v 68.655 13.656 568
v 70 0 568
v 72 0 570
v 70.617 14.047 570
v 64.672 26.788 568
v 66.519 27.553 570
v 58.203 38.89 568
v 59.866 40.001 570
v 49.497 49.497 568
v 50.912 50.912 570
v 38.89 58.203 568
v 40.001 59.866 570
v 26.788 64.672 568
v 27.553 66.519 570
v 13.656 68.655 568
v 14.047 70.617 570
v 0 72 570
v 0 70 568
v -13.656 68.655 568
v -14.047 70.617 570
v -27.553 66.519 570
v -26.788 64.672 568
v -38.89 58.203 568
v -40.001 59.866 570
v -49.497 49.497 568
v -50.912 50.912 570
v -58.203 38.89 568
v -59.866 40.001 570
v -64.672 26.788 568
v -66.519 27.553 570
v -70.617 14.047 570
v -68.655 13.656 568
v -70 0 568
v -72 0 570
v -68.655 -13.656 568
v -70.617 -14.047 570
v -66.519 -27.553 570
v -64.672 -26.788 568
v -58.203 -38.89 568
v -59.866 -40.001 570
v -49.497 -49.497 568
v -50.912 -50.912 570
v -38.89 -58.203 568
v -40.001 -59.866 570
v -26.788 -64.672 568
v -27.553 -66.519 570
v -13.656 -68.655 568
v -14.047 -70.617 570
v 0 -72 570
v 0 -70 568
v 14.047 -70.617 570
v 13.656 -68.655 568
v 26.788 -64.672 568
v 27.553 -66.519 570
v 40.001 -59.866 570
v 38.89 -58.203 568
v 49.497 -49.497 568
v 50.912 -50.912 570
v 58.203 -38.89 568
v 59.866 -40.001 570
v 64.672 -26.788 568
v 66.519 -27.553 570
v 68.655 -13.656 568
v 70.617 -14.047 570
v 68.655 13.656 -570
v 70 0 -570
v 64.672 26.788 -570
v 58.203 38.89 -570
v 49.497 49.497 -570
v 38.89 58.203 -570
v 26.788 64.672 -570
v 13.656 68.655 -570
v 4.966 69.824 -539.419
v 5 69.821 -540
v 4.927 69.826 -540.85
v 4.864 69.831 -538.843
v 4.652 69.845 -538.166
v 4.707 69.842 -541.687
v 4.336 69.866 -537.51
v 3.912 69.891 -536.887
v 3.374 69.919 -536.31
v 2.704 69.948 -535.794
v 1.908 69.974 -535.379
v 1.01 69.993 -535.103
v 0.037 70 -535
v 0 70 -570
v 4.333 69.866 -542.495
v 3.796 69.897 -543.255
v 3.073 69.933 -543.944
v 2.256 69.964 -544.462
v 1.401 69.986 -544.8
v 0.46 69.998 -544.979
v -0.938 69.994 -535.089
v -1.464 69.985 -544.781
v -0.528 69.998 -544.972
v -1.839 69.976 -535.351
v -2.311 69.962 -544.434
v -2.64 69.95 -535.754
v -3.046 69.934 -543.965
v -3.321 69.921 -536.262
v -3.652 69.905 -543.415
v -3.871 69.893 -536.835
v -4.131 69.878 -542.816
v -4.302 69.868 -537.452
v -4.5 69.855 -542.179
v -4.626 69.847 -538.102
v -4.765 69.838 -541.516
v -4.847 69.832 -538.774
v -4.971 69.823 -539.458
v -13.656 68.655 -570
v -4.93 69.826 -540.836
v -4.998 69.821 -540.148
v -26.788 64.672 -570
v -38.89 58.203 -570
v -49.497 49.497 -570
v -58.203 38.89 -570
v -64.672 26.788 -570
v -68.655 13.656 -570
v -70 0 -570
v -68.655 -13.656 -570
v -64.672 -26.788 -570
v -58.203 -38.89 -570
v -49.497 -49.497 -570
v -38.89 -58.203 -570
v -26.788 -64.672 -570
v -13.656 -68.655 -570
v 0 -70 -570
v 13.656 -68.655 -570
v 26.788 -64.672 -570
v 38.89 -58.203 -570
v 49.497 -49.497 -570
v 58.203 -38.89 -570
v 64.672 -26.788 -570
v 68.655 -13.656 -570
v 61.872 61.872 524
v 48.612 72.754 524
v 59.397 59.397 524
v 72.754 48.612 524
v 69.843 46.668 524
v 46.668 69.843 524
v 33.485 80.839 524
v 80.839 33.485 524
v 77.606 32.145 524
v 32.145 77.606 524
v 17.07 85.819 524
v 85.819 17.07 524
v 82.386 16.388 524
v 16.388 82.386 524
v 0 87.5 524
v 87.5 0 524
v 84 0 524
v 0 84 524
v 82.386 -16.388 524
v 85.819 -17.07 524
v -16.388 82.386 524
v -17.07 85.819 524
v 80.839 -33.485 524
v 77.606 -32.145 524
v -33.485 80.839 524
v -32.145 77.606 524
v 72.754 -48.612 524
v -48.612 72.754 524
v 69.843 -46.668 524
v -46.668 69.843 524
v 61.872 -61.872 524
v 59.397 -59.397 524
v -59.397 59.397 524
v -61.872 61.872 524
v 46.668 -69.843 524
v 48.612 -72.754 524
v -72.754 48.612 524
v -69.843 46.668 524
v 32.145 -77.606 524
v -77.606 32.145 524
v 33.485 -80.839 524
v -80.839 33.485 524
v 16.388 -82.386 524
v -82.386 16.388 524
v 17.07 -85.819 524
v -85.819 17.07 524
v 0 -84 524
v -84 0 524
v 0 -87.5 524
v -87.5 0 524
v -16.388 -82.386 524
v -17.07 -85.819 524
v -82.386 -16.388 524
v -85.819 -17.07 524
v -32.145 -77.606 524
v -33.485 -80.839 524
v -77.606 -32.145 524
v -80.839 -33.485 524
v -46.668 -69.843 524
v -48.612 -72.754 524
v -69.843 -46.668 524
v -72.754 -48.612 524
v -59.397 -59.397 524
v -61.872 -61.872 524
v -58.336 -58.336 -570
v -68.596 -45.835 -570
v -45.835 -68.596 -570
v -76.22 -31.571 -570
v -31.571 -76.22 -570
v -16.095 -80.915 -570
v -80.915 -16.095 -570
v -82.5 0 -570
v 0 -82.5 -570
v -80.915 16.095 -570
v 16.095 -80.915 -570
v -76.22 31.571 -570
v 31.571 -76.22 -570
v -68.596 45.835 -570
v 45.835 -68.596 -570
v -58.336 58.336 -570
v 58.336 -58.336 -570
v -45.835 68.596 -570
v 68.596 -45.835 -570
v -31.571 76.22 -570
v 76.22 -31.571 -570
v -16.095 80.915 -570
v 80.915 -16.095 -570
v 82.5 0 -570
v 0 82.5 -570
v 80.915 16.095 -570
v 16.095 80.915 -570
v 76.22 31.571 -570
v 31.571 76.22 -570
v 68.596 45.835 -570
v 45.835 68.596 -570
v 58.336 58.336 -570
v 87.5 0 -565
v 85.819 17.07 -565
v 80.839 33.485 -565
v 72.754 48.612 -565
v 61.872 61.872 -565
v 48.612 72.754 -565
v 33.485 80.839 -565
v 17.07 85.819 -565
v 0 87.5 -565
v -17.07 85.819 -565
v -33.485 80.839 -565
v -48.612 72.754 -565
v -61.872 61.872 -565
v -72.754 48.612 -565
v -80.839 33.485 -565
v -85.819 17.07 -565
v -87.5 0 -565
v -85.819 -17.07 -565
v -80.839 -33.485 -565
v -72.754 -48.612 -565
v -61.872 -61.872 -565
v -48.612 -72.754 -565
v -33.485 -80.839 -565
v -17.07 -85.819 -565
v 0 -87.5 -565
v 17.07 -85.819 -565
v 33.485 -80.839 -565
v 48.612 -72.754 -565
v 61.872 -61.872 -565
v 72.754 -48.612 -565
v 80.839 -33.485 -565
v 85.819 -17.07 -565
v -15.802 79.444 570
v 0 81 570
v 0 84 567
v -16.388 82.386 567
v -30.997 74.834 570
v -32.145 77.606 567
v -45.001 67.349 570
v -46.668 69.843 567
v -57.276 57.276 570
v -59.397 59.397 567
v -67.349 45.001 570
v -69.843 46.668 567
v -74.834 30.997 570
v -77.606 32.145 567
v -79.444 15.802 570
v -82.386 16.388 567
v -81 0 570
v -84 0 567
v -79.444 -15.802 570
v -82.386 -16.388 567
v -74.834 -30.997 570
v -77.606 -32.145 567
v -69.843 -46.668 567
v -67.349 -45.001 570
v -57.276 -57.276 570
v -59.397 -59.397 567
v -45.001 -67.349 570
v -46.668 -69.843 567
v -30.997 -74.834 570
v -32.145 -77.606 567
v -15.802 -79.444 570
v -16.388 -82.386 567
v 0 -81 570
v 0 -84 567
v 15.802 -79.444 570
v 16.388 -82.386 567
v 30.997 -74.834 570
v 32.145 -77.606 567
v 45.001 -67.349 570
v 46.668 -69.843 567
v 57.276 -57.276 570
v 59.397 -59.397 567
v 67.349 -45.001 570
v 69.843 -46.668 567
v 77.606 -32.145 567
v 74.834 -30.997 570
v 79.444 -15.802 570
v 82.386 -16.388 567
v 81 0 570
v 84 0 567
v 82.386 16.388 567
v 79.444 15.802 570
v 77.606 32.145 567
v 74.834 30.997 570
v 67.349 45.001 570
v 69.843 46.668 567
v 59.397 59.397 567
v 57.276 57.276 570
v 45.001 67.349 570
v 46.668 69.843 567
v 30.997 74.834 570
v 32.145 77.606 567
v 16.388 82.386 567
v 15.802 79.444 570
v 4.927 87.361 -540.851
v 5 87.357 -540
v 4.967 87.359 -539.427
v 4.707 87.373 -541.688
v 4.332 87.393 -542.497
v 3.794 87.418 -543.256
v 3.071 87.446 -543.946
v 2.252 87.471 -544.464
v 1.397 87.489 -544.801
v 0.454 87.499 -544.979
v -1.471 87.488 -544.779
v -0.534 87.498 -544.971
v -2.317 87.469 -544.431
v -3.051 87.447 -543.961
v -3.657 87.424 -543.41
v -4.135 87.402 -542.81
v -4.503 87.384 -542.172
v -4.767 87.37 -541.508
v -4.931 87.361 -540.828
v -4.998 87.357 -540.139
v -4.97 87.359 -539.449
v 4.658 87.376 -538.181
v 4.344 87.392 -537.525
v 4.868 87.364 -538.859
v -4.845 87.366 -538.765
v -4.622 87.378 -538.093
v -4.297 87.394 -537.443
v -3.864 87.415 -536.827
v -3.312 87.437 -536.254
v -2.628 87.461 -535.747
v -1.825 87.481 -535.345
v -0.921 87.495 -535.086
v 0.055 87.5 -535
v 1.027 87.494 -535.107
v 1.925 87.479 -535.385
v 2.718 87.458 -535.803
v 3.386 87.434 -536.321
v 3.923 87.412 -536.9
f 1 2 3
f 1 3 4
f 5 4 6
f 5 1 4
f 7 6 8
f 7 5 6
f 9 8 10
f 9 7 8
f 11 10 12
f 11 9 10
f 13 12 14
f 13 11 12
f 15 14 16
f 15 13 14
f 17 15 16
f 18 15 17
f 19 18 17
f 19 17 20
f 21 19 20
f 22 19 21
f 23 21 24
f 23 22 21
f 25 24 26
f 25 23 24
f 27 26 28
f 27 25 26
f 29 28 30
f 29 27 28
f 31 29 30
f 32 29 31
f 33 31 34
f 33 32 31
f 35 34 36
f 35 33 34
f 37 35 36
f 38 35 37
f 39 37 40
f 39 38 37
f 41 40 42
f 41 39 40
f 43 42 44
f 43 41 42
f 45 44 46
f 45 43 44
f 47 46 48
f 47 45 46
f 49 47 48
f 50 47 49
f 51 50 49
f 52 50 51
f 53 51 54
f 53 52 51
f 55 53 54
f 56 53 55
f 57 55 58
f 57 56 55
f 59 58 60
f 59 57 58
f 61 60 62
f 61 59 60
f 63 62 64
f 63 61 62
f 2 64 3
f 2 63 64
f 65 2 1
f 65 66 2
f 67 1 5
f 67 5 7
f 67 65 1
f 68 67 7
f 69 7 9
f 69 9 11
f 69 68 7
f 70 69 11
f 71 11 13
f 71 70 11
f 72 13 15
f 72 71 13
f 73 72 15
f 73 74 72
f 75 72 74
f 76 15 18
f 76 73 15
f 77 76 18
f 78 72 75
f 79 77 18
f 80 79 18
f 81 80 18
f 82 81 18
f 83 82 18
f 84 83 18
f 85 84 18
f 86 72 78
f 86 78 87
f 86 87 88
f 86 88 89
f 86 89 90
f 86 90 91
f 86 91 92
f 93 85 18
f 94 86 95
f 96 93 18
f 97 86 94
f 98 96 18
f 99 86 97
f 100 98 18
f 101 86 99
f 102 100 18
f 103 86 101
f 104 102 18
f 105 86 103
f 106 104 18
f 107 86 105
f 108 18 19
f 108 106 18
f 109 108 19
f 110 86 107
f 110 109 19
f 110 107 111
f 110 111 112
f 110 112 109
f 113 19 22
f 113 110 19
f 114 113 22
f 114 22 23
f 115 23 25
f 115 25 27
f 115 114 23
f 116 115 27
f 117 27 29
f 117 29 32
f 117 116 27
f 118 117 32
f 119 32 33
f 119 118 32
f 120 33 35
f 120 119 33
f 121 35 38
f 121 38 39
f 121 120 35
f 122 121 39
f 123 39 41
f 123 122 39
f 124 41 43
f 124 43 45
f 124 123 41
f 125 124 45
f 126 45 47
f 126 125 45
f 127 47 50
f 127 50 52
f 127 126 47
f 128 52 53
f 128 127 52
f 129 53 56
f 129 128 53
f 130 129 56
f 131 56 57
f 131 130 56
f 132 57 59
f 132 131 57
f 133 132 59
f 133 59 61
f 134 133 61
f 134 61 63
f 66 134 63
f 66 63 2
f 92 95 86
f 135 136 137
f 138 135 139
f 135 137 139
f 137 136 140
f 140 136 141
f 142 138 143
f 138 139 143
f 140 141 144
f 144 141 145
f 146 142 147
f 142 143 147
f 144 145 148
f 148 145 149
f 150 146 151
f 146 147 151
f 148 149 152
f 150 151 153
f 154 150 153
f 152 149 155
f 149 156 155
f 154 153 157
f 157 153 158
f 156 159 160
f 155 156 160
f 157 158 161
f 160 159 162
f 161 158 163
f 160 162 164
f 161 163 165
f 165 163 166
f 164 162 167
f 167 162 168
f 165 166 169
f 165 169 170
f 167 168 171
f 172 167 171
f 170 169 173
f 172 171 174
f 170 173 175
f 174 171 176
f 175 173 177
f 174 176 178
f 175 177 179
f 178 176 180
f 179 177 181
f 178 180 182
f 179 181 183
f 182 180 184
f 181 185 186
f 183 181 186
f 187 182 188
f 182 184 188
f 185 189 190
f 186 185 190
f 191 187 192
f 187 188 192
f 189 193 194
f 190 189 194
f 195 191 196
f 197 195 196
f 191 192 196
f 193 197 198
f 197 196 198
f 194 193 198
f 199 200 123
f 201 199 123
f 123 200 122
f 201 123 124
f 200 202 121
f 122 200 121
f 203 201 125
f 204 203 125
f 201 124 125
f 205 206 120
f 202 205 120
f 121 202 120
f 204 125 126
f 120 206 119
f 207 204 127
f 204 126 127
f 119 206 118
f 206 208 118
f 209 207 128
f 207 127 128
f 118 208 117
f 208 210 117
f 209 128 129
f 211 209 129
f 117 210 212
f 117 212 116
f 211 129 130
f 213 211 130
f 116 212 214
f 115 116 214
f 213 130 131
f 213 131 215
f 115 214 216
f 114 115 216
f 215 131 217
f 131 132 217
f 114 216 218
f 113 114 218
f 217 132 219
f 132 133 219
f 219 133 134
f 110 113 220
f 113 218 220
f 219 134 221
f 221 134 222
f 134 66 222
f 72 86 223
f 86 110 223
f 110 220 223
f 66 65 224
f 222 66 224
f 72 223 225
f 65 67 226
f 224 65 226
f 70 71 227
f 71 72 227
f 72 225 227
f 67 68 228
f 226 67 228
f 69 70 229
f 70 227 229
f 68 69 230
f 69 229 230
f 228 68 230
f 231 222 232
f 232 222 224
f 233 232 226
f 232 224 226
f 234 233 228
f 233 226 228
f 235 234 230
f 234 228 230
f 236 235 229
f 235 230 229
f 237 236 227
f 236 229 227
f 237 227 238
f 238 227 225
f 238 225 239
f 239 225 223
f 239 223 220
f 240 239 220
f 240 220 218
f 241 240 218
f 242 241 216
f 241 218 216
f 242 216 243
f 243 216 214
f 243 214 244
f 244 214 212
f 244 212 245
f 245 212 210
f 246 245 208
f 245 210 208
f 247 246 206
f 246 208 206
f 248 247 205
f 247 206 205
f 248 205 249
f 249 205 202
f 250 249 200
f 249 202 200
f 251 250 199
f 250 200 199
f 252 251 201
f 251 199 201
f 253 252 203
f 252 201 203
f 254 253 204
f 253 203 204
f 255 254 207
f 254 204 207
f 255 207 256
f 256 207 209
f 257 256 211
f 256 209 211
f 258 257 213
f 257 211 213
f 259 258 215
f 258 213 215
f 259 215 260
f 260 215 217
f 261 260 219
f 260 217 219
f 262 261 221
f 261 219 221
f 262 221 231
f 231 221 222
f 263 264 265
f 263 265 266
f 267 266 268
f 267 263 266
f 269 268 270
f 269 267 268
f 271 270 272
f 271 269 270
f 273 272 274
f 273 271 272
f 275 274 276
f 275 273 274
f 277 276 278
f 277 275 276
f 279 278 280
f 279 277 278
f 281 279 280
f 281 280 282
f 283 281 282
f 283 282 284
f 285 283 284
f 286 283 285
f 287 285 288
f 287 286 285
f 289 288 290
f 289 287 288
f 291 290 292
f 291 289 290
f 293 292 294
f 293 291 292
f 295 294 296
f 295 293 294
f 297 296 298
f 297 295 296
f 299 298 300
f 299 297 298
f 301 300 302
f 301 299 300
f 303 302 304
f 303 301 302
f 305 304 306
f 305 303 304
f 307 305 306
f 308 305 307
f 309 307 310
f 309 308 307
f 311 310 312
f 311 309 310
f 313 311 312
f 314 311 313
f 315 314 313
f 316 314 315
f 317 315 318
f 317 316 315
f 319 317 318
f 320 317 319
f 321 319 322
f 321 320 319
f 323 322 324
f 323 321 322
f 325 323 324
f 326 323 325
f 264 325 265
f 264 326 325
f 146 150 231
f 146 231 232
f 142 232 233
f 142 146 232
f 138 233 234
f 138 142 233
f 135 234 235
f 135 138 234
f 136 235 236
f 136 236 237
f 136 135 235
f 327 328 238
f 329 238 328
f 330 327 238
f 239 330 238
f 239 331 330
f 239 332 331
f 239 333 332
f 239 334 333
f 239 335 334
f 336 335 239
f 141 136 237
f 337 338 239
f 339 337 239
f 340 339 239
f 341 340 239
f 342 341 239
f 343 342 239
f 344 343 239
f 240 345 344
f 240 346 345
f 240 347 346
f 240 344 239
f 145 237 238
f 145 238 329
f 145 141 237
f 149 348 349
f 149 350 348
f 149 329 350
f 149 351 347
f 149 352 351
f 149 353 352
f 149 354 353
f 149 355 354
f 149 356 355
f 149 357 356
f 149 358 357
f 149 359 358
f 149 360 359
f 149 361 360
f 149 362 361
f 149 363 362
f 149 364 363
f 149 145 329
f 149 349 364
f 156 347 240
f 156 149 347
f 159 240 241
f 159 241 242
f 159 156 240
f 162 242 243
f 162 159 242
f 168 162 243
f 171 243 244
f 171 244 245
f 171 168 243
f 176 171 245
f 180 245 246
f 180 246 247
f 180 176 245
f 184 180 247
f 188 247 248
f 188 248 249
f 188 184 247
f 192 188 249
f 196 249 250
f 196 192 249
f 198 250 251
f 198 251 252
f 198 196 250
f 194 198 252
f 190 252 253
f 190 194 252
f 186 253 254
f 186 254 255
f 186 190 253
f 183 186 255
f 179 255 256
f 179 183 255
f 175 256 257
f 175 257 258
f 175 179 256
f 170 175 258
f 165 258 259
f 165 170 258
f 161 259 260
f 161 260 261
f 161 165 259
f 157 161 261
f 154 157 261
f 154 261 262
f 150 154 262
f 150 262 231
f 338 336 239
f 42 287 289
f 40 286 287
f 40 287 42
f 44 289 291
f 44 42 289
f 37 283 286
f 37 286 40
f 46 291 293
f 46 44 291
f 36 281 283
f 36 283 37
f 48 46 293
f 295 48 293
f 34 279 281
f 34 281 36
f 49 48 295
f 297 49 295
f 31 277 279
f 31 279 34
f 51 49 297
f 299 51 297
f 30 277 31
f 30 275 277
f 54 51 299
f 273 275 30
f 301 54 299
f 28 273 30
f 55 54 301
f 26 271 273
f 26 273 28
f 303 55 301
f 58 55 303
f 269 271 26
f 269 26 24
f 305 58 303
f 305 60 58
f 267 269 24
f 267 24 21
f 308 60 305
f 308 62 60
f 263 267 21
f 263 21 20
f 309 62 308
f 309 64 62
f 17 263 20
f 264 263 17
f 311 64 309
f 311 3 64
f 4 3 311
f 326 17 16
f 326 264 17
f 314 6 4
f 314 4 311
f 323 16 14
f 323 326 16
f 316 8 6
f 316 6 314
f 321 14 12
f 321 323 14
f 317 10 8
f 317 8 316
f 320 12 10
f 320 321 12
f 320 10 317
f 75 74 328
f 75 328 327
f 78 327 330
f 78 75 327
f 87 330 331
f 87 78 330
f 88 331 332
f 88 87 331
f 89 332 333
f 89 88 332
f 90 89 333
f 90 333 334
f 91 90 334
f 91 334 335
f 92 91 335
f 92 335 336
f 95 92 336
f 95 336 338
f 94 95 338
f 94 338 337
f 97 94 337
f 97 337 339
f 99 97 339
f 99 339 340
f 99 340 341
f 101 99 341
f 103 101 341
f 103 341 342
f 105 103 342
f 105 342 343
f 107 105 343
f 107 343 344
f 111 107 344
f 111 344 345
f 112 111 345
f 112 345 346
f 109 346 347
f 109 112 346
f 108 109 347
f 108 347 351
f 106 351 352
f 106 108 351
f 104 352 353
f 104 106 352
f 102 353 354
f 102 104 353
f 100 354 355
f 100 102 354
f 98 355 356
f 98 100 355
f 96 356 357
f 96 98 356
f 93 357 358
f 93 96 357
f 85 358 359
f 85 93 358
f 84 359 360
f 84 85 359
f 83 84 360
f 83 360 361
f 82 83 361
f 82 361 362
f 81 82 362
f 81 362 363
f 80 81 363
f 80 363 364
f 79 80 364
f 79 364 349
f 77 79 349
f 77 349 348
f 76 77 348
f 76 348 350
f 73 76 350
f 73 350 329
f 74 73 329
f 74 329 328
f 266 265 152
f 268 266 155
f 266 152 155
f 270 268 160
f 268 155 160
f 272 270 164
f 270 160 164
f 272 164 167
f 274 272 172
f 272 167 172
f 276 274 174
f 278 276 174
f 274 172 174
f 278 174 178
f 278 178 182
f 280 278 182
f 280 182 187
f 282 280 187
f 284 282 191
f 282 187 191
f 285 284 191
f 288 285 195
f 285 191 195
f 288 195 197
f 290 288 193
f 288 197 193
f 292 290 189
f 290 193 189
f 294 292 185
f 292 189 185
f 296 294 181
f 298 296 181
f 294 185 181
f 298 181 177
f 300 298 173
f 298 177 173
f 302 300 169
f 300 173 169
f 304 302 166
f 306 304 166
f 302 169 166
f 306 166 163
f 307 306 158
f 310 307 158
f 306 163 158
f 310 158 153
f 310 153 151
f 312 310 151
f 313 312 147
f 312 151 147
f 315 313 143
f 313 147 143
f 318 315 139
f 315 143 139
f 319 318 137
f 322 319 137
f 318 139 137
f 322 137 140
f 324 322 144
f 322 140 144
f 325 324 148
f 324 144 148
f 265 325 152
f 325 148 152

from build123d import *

# Parameters (mm, degrees)
SKETCH1_R           = 87.5
SKETCH1_R_2         = 70
BOSS_EXTRUDE1_DEPTH = 570
CHAMFER1_SIZE       = 5
SKETCH3_W           = 46
SKETCH3_H           = 23.271648671
CHAMFER2_SIZE       = 3
CHAMFER3_SIZE       = 2
SKETCH4_R           = 5
CUT_EXTRUDE1_DEPTH  = 102


with BuildPart() as part:
    # Sketch1 → Boss-Extrude1 (new body, symmetric)
    with BuildSketch(Plane.XY):
        Circle(SKETCH1_R)
        Circle(SKETCH1_R_2, mode=Mode.SUBTRACT)
    extrude(amount=BOSS_EXTRUDE1_DEPTH, both=True)

    # Chamfer1
    chamfer1_edges = [part.edges().sort_by_distance(p)[0] for p in [
        (-87.5, 0, -570),
    ]]
    chamfer(chamfer1_edges, length=CHAMFER1_SIZE)

    # Sketch3 → Cut-Revolve1 (revolve, cut)
    with BuildSketch(Plane(origin=(0, 0, 0), x_dir=(0, 0, -1), z_dir=(1, 0, 0))):
        with Locations((-547, 95.635824336)):
            Rectangle(SKETCH3_W, SKETCH3_H)
    revolve(axis=Axis((0, 0, 0), (0, 0, 1)), mode=Mode.SUBTRACT)

    # Chamfer2
    chamfer2_edges = [part.edges().sort_by_distance(p)[0] for p in [
        (0, -84, 570),
    ]]
    chamfer(chamfer2_edges, length=CHAMFER2_SIZE)

    # Chamfer3
    chamfer3_edges = [part.edges().sort_by_distance(p)[0] for p in [
        (-70, 0, 570),
    ]]
    chamfer(chamfer3_edges, length=CHAMFER3_SIZE)

    # Sketch4 → Cut-Extrude1 (cut)
    with BuildSketch(Plane(origin=(0, 0, 0), x_dir=(1, 0, 0), z_dir=(0, 1, 0))):
        with Locations((0, 540)):
            Circle(SKETCH4_R)
    extrude(amount=CUT_EXTRUDE1_DEPTH, mode=Mode.SUBTRACT)


solid = part.part
